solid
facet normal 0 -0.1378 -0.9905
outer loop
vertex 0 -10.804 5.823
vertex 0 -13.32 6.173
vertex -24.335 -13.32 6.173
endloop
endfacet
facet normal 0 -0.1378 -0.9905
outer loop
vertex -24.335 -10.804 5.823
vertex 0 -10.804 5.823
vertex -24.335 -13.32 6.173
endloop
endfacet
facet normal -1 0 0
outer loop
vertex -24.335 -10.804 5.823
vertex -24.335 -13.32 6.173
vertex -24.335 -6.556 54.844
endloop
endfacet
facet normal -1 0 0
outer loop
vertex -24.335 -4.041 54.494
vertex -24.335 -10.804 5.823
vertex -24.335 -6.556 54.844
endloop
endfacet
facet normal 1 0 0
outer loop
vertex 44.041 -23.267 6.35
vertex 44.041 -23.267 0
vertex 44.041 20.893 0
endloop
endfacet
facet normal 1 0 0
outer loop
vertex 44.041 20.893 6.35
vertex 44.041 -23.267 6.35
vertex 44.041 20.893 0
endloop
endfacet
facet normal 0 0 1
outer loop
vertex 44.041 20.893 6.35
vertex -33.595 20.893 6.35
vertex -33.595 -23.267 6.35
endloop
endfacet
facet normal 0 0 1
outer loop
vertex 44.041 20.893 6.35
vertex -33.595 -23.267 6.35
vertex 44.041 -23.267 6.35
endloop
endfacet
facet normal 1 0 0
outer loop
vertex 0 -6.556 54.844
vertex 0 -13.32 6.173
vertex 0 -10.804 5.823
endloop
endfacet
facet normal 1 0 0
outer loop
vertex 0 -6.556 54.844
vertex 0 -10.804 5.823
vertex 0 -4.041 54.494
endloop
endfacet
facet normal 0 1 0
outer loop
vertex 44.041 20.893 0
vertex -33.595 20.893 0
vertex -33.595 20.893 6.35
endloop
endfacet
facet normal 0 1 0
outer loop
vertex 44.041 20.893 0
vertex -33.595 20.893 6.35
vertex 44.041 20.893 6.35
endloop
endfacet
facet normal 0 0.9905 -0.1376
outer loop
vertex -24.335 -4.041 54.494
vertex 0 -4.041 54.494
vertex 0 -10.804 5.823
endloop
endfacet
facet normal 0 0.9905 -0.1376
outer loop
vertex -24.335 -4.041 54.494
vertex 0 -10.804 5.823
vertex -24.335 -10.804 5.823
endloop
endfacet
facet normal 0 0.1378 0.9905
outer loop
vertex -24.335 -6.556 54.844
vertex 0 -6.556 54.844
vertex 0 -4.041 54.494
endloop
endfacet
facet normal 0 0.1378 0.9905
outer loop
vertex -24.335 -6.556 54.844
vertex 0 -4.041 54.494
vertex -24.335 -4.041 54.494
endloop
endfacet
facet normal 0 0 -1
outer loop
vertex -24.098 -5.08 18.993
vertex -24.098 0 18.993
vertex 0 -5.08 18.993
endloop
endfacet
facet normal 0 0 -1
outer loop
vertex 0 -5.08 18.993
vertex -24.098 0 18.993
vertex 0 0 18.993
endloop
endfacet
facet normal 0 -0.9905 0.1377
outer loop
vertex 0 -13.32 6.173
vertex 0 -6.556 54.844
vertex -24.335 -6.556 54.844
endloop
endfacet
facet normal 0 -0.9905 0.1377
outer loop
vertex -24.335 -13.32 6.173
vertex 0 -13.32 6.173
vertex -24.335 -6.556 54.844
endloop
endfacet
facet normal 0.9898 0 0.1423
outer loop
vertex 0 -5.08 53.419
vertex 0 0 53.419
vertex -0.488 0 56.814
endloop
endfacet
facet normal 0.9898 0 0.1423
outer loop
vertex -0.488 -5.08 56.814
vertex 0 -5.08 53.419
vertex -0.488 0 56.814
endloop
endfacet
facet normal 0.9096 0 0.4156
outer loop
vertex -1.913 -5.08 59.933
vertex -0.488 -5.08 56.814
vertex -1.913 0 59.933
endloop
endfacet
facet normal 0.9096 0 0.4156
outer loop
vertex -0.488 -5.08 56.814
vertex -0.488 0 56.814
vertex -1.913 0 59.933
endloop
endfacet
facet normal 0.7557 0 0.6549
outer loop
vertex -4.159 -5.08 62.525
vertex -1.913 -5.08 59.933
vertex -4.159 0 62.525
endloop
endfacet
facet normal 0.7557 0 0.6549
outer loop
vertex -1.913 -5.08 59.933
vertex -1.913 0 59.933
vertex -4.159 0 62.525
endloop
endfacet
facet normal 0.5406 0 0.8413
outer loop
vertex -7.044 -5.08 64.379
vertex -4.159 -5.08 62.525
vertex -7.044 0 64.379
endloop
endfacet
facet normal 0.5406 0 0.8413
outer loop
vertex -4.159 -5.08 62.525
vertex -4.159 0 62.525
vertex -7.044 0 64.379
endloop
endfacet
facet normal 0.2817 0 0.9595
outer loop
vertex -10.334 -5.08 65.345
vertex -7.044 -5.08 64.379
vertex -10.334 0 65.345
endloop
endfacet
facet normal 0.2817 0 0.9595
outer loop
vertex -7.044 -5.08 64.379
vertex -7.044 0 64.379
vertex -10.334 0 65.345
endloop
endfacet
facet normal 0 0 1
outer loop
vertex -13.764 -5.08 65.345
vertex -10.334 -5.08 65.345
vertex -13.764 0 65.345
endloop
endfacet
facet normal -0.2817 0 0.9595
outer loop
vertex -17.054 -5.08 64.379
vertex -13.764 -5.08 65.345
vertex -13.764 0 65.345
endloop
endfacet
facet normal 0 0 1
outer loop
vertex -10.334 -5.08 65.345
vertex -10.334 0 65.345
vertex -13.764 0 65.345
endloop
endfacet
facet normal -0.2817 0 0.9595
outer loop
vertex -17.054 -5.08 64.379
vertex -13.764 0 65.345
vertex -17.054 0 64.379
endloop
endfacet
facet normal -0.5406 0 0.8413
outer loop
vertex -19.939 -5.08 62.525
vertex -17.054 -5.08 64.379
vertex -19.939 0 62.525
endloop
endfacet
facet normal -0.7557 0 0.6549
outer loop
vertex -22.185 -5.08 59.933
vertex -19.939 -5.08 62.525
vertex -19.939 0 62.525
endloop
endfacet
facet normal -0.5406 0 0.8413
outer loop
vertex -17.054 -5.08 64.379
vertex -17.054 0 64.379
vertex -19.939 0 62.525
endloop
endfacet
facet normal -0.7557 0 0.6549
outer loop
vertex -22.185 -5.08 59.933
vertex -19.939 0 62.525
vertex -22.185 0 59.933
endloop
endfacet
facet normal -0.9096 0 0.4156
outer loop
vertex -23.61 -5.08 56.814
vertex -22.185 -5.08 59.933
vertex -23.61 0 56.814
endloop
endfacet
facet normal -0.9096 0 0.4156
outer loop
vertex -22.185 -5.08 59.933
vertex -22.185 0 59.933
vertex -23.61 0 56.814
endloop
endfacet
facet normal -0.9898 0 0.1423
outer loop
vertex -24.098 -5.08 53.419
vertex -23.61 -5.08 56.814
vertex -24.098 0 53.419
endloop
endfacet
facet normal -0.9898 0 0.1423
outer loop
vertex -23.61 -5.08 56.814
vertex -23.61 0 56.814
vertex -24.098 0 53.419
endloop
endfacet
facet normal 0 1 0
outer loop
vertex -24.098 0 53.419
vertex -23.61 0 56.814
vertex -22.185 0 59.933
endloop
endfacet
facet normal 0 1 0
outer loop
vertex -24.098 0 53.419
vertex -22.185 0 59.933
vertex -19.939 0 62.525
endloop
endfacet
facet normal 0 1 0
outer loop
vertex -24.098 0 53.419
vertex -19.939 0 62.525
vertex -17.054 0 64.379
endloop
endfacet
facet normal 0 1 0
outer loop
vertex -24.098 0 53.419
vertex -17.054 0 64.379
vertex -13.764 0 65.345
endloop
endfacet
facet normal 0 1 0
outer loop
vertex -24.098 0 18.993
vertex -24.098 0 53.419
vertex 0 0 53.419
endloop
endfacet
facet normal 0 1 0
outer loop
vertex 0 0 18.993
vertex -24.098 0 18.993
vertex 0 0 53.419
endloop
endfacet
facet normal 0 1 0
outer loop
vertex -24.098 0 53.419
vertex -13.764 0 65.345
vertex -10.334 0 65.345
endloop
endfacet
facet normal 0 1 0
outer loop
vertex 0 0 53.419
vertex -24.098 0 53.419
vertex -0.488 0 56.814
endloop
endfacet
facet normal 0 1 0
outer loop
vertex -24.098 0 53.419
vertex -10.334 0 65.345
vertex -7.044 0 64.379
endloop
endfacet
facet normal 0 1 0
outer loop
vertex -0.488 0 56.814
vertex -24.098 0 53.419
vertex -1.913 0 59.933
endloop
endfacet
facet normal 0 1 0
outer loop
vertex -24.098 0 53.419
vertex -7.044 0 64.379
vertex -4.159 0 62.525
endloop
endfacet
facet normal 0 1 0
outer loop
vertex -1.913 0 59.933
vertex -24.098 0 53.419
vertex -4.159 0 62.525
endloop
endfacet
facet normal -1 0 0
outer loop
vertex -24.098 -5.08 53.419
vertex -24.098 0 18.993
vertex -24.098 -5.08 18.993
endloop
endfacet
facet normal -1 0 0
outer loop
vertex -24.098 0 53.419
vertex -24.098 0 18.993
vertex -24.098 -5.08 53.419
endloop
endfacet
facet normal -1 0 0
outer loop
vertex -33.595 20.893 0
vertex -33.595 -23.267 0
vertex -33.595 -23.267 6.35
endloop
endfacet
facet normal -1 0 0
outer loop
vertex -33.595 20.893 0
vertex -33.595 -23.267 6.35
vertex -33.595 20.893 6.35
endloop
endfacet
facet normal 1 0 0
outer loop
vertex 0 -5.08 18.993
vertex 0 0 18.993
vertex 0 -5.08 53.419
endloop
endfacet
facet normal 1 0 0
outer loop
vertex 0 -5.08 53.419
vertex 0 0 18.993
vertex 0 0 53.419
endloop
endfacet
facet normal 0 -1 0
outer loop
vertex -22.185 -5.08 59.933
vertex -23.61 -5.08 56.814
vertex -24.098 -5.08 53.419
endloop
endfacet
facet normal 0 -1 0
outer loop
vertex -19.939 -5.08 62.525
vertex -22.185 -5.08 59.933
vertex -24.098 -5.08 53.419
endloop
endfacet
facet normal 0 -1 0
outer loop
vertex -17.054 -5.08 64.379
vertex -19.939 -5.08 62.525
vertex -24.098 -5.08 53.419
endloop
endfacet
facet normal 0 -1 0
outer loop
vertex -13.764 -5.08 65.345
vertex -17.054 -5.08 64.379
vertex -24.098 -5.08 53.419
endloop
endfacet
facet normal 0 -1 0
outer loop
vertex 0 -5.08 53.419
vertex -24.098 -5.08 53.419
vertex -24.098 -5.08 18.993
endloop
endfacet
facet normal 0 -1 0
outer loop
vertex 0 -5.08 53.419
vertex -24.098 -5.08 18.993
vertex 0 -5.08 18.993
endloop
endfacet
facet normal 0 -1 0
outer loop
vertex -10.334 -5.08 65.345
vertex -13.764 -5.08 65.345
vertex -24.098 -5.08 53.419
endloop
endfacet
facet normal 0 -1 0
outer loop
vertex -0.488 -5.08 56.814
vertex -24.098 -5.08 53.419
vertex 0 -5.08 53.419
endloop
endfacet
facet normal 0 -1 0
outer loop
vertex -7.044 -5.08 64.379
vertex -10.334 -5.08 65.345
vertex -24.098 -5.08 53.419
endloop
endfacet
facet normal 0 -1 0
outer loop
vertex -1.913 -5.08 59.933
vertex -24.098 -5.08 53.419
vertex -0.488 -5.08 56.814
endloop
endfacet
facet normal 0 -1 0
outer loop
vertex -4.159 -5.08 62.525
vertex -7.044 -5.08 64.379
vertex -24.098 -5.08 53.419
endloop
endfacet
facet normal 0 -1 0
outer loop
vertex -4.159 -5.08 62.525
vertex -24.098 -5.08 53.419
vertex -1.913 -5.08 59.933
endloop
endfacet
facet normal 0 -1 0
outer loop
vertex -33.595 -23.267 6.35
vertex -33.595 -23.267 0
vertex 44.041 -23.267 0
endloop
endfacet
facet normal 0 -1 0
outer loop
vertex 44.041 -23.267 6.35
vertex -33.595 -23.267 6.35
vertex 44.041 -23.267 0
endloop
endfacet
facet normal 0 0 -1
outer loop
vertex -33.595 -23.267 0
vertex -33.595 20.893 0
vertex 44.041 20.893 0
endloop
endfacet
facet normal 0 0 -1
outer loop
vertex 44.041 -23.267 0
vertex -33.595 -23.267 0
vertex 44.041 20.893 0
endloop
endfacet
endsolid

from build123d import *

# Parameters (mm, degrees)
F0_W      = 77.6358172297
F0_H      = 44.1598240286
F1_DEPTH  = 6.35
F2_W      = 24.0979678929
F2_H      = 34.4256665558
F3_DEPTH  = 5.08
F13_W     = 24.3353862315
F13_H     = 49.1384794004
F14_DEPTH = 2.54


with BuildPart() as f1:
    # F0 (on Top) → F1 (new body)
    with BuildSketch(Plane.XY):
        with Locations((5.2232034504, -1.1870926246)):
            Rectangle(F0_W, F0_H)
    extrude(amount=F1_DEPTH)


with BuildPart() as f3:
    # F2 (on Front) → F3 (new body)
    with BuildSketch(Plane.XZ):
        with BuildLine():
            ThreePointArc((0, 53.4191392362), (-12.0489839464, 65.4681231827), (-24.0979678929, 53.4191392362))
            Line((-24.0979678929, 53.4191392362), (0, 53.4191392362))
        make_face()
        with Locations((-12.0489839464, 36.2063059583)):
            Rectangle(F2_W, F2_H)
    extrude(amount=F3_DEPTH)


with BuildPart() as f14:
    # F13 (on 3pt) → F14 (new body)
    with BuildSketch(Plane(origin=(0, -13.9092554561, 1.9329184528), x_dir=(-1, 0, 0), z_dir=(0, 0.990481816, -0.1376436421))):
        with Locations((12.1676931158, 28.8499442395)):
            Rectangle(F13_W, F13_H)
    extrude(amount=F14_DEPTH)


solid = Compound([f1.part, f3.part, f14.part])
